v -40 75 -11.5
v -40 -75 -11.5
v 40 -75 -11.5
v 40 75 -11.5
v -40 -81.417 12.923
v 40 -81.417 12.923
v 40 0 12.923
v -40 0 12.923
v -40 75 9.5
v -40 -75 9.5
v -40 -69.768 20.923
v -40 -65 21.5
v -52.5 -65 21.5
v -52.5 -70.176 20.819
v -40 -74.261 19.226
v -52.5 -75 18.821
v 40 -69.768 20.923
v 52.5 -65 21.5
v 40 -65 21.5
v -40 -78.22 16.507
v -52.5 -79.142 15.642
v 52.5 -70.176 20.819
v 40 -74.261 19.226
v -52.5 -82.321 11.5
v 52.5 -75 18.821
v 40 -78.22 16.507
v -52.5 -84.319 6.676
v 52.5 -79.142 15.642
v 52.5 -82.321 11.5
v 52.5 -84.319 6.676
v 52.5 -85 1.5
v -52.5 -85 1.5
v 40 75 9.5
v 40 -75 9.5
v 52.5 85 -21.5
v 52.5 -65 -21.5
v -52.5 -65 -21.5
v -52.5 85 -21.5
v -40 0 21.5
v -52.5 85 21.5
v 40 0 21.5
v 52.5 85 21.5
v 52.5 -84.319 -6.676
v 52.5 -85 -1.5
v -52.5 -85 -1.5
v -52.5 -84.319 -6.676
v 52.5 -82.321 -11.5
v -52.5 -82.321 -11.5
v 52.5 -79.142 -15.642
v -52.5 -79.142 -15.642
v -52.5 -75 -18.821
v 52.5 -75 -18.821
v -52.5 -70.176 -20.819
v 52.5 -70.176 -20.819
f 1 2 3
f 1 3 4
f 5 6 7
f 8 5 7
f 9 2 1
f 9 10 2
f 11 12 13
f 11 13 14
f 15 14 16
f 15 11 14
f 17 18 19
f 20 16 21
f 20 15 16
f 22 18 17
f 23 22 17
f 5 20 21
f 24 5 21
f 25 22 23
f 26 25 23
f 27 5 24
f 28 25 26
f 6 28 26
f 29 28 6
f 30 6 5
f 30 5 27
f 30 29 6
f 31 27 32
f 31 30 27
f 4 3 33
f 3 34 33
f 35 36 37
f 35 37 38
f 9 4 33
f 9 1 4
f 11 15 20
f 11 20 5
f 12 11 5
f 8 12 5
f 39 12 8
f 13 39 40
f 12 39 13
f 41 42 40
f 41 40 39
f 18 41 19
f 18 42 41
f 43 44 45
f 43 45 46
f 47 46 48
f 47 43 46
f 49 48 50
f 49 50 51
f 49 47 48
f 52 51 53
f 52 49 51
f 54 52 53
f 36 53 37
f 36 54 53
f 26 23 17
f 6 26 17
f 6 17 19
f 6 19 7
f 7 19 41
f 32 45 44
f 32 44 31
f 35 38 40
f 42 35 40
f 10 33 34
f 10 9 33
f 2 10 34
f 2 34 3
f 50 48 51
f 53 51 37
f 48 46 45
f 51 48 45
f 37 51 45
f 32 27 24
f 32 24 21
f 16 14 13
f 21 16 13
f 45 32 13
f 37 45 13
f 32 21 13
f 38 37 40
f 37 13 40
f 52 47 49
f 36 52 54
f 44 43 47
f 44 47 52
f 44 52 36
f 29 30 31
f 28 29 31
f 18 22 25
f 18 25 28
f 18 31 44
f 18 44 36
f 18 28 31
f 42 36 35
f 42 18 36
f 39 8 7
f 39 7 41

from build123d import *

# Parameters (mm, degrees)
F0_W     = 170
F0_H     = 3
F1_DEPTH = 52.5
F3_DEPTH = 40
F4_DEPTH = 40


with BuildPart() as f1:
    # F0 (on Right) → F1 (new body, symmetric)
    with BuildSketch(Plane.YZ):
        with BuildLine():
            ThreePointArc((-65, 21.5), (-79.142136, 15.642136), (-85, 1.5))
            Line((-85, 1.5), (85, 1.5))
            Line((85, 1.5), (85, 21.5))
            Line((85, 21.5), (-65, 21.5))
        make_face()
        with BuildLine():
            Line((85, -1.5), (-85, -1.5))
            ThreePointArc((-85, -1.5), (-79.142136, -15.642136), (-65, -21.5))
            Line((-65, -21.5), (85, -21.5))
            Line((85, -21.5), (85, -1.5))
        make_face()
        Rectangle(F0_W, F0_H)
    extrude(amount=F1_DEPTH, both=True)

    # F2 (on Right) → F3 (cut, symmetric)
    with BuildSketch(Plane.YZ):
        Polygon((0, 12.922657), (0, 22.922657), (-87.274782, 22.922657), (-84.384896, 12.922657), align=None)
    extrude(amount=F3_DEPTH, both=True, mode=Mode.SUBTRACT)

    # F2 (on Right) → F4 (cut, symmetric)
    with BuildSketch(Plane.YZ):
        Polygon((-75, -11.5), (75, -11.5), (75, 9.5), (-75, 9.5), (-75, 1.5), (-75, 0), (-75, -1.5), align=None)
        Polygon((0, 12.922657), (0, 22.922657), (-87.274782, 22.922657), (-84.384896, 12.922657), align=None)
    extrude(amount=F4_DEPTH, both=True, mode=Mode.SUBTRACT)


solid = f1.part
